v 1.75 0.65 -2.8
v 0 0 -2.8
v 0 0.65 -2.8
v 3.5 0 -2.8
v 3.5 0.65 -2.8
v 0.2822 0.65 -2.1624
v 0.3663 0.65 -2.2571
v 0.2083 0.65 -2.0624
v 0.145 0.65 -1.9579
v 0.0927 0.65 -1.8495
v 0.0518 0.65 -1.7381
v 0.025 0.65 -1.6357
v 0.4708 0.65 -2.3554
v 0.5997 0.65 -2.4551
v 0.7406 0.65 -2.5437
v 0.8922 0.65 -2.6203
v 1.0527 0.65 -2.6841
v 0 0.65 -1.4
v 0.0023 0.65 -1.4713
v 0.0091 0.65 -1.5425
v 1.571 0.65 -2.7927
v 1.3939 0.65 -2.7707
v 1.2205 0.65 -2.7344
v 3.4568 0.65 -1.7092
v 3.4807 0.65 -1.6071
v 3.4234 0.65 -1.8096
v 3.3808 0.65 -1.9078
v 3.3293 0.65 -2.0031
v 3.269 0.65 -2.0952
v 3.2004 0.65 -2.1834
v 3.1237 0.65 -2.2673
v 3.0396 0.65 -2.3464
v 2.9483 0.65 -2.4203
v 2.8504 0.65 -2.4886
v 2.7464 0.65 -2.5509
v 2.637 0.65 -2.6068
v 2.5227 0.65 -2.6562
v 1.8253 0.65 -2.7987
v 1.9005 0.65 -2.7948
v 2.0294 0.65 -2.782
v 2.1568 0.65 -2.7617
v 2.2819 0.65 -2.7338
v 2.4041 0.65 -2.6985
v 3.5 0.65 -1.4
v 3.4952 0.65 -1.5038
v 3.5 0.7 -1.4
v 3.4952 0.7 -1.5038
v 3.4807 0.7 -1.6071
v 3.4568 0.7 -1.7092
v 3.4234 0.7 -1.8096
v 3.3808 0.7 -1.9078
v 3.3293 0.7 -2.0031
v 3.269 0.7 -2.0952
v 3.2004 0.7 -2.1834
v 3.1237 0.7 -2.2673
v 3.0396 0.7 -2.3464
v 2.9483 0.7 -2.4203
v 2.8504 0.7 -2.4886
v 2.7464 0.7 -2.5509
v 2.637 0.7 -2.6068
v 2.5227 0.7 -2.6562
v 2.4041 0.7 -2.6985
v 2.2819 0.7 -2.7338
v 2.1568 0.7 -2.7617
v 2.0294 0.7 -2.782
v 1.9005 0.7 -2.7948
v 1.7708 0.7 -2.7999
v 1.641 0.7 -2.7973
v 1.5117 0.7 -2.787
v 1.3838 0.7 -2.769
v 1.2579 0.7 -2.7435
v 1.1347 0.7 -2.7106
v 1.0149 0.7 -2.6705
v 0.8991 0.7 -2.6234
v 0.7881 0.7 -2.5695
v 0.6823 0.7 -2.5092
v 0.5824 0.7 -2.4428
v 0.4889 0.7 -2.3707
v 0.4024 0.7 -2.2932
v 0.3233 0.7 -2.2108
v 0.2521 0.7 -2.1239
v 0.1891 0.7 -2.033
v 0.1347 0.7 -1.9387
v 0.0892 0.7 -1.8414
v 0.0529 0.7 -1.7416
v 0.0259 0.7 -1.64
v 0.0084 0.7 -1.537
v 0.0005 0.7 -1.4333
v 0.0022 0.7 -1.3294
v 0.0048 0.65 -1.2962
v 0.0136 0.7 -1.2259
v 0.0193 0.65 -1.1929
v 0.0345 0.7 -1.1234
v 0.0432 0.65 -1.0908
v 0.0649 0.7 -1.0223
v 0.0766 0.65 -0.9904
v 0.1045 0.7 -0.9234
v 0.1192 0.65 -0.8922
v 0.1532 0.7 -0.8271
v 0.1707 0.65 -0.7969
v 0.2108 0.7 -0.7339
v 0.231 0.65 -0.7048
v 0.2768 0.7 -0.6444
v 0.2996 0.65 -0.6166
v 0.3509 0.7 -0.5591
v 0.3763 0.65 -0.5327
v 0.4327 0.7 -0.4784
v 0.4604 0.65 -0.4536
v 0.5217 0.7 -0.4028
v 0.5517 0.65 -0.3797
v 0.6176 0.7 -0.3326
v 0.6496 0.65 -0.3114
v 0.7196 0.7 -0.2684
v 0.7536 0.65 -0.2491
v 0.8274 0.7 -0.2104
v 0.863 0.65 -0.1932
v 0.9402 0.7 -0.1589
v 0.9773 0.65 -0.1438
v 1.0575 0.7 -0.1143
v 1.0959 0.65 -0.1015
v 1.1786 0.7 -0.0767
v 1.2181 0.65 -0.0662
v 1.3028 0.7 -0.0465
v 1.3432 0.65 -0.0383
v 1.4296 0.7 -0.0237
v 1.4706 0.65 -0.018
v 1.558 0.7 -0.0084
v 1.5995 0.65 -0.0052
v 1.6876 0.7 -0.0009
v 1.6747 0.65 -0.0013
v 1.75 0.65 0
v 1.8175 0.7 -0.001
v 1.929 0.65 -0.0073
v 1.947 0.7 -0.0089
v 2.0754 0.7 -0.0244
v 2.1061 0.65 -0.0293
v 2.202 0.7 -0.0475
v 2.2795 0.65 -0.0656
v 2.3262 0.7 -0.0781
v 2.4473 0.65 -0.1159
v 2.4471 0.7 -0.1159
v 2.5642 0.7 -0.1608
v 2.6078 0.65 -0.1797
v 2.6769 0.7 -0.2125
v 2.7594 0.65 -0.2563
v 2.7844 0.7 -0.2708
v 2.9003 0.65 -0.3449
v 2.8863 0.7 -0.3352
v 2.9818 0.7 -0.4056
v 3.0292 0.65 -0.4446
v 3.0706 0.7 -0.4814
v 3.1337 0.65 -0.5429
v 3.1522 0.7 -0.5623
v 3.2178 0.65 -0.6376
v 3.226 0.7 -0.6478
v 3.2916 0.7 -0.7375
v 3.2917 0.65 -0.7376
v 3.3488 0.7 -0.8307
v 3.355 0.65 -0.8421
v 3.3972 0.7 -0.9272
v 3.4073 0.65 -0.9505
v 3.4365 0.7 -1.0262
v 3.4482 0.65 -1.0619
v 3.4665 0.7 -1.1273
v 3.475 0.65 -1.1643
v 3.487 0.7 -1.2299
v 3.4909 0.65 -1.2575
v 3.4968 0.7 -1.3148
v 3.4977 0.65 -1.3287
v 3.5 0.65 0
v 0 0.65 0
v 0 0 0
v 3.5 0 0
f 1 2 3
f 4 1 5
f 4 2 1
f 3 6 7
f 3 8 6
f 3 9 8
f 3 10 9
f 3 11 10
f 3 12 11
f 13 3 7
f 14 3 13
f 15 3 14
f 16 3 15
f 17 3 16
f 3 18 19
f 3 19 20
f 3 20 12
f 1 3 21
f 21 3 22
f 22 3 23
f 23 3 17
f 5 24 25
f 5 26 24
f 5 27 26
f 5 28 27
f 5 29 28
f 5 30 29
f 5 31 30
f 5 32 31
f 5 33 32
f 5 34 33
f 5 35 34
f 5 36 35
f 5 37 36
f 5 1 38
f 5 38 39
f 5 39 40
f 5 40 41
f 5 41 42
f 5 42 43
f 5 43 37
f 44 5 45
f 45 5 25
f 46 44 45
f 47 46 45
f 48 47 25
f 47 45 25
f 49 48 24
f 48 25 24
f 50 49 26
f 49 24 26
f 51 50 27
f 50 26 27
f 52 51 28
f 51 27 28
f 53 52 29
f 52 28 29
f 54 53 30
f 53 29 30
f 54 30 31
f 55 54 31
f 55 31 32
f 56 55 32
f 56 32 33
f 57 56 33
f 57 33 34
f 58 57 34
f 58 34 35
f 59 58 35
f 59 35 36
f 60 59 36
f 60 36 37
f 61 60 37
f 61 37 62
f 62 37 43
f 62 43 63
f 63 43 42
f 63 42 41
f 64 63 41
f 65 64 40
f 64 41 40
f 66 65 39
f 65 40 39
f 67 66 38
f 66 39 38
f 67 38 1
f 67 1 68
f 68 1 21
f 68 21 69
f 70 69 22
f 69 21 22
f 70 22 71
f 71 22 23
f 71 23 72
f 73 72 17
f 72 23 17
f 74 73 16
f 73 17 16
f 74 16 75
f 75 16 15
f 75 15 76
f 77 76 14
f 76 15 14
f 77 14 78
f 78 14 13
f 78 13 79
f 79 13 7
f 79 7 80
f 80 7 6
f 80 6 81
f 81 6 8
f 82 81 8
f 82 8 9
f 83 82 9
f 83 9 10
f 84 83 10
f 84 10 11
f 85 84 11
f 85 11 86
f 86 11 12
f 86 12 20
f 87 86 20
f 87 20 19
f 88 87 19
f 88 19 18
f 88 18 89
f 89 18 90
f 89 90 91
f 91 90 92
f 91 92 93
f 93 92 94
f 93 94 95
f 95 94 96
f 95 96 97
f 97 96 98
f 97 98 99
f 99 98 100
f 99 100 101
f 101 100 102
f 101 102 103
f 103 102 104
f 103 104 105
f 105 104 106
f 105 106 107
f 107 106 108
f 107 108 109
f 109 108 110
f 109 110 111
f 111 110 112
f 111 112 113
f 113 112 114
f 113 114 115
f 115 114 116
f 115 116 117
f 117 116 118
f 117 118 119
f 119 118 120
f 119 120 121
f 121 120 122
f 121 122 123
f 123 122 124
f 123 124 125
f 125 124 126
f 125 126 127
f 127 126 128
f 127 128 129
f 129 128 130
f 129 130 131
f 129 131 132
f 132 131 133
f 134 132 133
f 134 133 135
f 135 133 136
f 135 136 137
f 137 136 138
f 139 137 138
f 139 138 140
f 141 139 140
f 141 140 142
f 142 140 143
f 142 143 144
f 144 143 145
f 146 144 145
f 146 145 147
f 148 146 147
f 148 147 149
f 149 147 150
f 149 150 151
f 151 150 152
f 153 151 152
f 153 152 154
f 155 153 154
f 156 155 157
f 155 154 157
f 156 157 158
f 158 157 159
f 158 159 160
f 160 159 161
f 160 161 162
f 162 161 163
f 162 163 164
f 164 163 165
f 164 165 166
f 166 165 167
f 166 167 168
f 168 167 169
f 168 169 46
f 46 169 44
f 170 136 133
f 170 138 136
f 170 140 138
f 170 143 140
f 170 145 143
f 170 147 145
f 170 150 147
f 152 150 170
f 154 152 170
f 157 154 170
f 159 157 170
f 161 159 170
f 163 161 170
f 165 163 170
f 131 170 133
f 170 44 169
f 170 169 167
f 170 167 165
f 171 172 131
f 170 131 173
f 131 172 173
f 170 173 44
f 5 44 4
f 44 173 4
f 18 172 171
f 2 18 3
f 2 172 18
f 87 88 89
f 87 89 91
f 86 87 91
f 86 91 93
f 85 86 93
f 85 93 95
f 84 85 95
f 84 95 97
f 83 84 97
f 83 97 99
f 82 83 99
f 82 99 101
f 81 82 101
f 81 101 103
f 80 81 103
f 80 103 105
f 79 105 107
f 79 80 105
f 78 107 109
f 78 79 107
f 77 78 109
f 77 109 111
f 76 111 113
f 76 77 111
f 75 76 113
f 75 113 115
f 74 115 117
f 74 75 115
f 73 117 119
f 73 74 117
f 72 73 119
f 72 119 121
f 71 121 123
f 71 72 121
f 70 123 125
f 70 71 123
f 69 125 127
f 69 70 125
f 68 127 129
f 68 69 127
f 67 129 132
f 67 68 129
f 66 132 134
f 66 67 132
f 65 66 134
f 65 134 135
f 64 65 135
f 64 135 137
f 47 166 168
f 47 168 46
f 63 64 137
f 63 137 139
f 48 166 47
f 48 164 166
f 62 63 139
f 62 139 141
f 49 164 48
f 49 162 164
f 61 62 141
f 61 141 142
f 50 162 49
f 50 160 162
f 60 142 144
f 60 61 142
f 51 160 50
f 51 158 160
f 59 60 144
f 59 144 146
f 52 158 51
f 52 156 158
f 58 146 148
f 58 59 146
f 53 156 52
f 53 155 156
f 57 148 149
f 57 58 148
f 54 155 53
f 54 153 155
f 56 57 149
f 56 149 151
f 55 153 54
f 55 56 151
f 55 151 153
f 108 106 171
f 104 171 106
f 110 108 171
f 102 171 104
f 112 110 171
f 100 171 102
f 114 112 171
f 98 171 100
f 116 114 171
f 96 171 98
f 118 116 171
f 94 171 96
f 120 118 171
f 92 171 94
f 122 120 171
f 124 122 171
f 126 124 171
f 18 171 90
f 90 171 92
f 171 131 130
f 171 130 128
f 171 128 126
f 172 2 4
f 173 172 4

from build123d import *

# Parameters (mm, degrees)
SKETCH1_W           = 3.5
SKETCH1_H           = 2.8
BOSS_EXTRUDE1_DEPTH = 0.65
SKETCH3_RX          = 1.75
SKETCH3_RY          = 1.4
BOSS_EXTRUDE2_DEPTH = 0.05


with BuildPart() as part:
    # Sketch1 → Boss-Extrude1 (new body)
    with BuildSketch(Plane(origin=(0, 0, 0), x_dir=(1, 0, 0), z_dir=(0, 1, 0))):
        with Locations((1.75, 1.4)):
            Rectangle(SKETCH1_W, SKETCH1_H)
    extrude(amount=BOSS_EXTRUDE1_DEPTH)

    # Sketch3 → Boss-Extrude2 (add)
    with BuildSketch(Plane(origin=(0, 0.65, 0), x_dir=(1, 0, 0), z_dir=(0, 1, 0))):
        with Locations((1.75, 1.4)):
            Ellipse(SKETCH3_RX, SKETCH3_RY)
    extrude(amount=BOSS_EXTRUDE2_DEPTH)


solid = part.part
